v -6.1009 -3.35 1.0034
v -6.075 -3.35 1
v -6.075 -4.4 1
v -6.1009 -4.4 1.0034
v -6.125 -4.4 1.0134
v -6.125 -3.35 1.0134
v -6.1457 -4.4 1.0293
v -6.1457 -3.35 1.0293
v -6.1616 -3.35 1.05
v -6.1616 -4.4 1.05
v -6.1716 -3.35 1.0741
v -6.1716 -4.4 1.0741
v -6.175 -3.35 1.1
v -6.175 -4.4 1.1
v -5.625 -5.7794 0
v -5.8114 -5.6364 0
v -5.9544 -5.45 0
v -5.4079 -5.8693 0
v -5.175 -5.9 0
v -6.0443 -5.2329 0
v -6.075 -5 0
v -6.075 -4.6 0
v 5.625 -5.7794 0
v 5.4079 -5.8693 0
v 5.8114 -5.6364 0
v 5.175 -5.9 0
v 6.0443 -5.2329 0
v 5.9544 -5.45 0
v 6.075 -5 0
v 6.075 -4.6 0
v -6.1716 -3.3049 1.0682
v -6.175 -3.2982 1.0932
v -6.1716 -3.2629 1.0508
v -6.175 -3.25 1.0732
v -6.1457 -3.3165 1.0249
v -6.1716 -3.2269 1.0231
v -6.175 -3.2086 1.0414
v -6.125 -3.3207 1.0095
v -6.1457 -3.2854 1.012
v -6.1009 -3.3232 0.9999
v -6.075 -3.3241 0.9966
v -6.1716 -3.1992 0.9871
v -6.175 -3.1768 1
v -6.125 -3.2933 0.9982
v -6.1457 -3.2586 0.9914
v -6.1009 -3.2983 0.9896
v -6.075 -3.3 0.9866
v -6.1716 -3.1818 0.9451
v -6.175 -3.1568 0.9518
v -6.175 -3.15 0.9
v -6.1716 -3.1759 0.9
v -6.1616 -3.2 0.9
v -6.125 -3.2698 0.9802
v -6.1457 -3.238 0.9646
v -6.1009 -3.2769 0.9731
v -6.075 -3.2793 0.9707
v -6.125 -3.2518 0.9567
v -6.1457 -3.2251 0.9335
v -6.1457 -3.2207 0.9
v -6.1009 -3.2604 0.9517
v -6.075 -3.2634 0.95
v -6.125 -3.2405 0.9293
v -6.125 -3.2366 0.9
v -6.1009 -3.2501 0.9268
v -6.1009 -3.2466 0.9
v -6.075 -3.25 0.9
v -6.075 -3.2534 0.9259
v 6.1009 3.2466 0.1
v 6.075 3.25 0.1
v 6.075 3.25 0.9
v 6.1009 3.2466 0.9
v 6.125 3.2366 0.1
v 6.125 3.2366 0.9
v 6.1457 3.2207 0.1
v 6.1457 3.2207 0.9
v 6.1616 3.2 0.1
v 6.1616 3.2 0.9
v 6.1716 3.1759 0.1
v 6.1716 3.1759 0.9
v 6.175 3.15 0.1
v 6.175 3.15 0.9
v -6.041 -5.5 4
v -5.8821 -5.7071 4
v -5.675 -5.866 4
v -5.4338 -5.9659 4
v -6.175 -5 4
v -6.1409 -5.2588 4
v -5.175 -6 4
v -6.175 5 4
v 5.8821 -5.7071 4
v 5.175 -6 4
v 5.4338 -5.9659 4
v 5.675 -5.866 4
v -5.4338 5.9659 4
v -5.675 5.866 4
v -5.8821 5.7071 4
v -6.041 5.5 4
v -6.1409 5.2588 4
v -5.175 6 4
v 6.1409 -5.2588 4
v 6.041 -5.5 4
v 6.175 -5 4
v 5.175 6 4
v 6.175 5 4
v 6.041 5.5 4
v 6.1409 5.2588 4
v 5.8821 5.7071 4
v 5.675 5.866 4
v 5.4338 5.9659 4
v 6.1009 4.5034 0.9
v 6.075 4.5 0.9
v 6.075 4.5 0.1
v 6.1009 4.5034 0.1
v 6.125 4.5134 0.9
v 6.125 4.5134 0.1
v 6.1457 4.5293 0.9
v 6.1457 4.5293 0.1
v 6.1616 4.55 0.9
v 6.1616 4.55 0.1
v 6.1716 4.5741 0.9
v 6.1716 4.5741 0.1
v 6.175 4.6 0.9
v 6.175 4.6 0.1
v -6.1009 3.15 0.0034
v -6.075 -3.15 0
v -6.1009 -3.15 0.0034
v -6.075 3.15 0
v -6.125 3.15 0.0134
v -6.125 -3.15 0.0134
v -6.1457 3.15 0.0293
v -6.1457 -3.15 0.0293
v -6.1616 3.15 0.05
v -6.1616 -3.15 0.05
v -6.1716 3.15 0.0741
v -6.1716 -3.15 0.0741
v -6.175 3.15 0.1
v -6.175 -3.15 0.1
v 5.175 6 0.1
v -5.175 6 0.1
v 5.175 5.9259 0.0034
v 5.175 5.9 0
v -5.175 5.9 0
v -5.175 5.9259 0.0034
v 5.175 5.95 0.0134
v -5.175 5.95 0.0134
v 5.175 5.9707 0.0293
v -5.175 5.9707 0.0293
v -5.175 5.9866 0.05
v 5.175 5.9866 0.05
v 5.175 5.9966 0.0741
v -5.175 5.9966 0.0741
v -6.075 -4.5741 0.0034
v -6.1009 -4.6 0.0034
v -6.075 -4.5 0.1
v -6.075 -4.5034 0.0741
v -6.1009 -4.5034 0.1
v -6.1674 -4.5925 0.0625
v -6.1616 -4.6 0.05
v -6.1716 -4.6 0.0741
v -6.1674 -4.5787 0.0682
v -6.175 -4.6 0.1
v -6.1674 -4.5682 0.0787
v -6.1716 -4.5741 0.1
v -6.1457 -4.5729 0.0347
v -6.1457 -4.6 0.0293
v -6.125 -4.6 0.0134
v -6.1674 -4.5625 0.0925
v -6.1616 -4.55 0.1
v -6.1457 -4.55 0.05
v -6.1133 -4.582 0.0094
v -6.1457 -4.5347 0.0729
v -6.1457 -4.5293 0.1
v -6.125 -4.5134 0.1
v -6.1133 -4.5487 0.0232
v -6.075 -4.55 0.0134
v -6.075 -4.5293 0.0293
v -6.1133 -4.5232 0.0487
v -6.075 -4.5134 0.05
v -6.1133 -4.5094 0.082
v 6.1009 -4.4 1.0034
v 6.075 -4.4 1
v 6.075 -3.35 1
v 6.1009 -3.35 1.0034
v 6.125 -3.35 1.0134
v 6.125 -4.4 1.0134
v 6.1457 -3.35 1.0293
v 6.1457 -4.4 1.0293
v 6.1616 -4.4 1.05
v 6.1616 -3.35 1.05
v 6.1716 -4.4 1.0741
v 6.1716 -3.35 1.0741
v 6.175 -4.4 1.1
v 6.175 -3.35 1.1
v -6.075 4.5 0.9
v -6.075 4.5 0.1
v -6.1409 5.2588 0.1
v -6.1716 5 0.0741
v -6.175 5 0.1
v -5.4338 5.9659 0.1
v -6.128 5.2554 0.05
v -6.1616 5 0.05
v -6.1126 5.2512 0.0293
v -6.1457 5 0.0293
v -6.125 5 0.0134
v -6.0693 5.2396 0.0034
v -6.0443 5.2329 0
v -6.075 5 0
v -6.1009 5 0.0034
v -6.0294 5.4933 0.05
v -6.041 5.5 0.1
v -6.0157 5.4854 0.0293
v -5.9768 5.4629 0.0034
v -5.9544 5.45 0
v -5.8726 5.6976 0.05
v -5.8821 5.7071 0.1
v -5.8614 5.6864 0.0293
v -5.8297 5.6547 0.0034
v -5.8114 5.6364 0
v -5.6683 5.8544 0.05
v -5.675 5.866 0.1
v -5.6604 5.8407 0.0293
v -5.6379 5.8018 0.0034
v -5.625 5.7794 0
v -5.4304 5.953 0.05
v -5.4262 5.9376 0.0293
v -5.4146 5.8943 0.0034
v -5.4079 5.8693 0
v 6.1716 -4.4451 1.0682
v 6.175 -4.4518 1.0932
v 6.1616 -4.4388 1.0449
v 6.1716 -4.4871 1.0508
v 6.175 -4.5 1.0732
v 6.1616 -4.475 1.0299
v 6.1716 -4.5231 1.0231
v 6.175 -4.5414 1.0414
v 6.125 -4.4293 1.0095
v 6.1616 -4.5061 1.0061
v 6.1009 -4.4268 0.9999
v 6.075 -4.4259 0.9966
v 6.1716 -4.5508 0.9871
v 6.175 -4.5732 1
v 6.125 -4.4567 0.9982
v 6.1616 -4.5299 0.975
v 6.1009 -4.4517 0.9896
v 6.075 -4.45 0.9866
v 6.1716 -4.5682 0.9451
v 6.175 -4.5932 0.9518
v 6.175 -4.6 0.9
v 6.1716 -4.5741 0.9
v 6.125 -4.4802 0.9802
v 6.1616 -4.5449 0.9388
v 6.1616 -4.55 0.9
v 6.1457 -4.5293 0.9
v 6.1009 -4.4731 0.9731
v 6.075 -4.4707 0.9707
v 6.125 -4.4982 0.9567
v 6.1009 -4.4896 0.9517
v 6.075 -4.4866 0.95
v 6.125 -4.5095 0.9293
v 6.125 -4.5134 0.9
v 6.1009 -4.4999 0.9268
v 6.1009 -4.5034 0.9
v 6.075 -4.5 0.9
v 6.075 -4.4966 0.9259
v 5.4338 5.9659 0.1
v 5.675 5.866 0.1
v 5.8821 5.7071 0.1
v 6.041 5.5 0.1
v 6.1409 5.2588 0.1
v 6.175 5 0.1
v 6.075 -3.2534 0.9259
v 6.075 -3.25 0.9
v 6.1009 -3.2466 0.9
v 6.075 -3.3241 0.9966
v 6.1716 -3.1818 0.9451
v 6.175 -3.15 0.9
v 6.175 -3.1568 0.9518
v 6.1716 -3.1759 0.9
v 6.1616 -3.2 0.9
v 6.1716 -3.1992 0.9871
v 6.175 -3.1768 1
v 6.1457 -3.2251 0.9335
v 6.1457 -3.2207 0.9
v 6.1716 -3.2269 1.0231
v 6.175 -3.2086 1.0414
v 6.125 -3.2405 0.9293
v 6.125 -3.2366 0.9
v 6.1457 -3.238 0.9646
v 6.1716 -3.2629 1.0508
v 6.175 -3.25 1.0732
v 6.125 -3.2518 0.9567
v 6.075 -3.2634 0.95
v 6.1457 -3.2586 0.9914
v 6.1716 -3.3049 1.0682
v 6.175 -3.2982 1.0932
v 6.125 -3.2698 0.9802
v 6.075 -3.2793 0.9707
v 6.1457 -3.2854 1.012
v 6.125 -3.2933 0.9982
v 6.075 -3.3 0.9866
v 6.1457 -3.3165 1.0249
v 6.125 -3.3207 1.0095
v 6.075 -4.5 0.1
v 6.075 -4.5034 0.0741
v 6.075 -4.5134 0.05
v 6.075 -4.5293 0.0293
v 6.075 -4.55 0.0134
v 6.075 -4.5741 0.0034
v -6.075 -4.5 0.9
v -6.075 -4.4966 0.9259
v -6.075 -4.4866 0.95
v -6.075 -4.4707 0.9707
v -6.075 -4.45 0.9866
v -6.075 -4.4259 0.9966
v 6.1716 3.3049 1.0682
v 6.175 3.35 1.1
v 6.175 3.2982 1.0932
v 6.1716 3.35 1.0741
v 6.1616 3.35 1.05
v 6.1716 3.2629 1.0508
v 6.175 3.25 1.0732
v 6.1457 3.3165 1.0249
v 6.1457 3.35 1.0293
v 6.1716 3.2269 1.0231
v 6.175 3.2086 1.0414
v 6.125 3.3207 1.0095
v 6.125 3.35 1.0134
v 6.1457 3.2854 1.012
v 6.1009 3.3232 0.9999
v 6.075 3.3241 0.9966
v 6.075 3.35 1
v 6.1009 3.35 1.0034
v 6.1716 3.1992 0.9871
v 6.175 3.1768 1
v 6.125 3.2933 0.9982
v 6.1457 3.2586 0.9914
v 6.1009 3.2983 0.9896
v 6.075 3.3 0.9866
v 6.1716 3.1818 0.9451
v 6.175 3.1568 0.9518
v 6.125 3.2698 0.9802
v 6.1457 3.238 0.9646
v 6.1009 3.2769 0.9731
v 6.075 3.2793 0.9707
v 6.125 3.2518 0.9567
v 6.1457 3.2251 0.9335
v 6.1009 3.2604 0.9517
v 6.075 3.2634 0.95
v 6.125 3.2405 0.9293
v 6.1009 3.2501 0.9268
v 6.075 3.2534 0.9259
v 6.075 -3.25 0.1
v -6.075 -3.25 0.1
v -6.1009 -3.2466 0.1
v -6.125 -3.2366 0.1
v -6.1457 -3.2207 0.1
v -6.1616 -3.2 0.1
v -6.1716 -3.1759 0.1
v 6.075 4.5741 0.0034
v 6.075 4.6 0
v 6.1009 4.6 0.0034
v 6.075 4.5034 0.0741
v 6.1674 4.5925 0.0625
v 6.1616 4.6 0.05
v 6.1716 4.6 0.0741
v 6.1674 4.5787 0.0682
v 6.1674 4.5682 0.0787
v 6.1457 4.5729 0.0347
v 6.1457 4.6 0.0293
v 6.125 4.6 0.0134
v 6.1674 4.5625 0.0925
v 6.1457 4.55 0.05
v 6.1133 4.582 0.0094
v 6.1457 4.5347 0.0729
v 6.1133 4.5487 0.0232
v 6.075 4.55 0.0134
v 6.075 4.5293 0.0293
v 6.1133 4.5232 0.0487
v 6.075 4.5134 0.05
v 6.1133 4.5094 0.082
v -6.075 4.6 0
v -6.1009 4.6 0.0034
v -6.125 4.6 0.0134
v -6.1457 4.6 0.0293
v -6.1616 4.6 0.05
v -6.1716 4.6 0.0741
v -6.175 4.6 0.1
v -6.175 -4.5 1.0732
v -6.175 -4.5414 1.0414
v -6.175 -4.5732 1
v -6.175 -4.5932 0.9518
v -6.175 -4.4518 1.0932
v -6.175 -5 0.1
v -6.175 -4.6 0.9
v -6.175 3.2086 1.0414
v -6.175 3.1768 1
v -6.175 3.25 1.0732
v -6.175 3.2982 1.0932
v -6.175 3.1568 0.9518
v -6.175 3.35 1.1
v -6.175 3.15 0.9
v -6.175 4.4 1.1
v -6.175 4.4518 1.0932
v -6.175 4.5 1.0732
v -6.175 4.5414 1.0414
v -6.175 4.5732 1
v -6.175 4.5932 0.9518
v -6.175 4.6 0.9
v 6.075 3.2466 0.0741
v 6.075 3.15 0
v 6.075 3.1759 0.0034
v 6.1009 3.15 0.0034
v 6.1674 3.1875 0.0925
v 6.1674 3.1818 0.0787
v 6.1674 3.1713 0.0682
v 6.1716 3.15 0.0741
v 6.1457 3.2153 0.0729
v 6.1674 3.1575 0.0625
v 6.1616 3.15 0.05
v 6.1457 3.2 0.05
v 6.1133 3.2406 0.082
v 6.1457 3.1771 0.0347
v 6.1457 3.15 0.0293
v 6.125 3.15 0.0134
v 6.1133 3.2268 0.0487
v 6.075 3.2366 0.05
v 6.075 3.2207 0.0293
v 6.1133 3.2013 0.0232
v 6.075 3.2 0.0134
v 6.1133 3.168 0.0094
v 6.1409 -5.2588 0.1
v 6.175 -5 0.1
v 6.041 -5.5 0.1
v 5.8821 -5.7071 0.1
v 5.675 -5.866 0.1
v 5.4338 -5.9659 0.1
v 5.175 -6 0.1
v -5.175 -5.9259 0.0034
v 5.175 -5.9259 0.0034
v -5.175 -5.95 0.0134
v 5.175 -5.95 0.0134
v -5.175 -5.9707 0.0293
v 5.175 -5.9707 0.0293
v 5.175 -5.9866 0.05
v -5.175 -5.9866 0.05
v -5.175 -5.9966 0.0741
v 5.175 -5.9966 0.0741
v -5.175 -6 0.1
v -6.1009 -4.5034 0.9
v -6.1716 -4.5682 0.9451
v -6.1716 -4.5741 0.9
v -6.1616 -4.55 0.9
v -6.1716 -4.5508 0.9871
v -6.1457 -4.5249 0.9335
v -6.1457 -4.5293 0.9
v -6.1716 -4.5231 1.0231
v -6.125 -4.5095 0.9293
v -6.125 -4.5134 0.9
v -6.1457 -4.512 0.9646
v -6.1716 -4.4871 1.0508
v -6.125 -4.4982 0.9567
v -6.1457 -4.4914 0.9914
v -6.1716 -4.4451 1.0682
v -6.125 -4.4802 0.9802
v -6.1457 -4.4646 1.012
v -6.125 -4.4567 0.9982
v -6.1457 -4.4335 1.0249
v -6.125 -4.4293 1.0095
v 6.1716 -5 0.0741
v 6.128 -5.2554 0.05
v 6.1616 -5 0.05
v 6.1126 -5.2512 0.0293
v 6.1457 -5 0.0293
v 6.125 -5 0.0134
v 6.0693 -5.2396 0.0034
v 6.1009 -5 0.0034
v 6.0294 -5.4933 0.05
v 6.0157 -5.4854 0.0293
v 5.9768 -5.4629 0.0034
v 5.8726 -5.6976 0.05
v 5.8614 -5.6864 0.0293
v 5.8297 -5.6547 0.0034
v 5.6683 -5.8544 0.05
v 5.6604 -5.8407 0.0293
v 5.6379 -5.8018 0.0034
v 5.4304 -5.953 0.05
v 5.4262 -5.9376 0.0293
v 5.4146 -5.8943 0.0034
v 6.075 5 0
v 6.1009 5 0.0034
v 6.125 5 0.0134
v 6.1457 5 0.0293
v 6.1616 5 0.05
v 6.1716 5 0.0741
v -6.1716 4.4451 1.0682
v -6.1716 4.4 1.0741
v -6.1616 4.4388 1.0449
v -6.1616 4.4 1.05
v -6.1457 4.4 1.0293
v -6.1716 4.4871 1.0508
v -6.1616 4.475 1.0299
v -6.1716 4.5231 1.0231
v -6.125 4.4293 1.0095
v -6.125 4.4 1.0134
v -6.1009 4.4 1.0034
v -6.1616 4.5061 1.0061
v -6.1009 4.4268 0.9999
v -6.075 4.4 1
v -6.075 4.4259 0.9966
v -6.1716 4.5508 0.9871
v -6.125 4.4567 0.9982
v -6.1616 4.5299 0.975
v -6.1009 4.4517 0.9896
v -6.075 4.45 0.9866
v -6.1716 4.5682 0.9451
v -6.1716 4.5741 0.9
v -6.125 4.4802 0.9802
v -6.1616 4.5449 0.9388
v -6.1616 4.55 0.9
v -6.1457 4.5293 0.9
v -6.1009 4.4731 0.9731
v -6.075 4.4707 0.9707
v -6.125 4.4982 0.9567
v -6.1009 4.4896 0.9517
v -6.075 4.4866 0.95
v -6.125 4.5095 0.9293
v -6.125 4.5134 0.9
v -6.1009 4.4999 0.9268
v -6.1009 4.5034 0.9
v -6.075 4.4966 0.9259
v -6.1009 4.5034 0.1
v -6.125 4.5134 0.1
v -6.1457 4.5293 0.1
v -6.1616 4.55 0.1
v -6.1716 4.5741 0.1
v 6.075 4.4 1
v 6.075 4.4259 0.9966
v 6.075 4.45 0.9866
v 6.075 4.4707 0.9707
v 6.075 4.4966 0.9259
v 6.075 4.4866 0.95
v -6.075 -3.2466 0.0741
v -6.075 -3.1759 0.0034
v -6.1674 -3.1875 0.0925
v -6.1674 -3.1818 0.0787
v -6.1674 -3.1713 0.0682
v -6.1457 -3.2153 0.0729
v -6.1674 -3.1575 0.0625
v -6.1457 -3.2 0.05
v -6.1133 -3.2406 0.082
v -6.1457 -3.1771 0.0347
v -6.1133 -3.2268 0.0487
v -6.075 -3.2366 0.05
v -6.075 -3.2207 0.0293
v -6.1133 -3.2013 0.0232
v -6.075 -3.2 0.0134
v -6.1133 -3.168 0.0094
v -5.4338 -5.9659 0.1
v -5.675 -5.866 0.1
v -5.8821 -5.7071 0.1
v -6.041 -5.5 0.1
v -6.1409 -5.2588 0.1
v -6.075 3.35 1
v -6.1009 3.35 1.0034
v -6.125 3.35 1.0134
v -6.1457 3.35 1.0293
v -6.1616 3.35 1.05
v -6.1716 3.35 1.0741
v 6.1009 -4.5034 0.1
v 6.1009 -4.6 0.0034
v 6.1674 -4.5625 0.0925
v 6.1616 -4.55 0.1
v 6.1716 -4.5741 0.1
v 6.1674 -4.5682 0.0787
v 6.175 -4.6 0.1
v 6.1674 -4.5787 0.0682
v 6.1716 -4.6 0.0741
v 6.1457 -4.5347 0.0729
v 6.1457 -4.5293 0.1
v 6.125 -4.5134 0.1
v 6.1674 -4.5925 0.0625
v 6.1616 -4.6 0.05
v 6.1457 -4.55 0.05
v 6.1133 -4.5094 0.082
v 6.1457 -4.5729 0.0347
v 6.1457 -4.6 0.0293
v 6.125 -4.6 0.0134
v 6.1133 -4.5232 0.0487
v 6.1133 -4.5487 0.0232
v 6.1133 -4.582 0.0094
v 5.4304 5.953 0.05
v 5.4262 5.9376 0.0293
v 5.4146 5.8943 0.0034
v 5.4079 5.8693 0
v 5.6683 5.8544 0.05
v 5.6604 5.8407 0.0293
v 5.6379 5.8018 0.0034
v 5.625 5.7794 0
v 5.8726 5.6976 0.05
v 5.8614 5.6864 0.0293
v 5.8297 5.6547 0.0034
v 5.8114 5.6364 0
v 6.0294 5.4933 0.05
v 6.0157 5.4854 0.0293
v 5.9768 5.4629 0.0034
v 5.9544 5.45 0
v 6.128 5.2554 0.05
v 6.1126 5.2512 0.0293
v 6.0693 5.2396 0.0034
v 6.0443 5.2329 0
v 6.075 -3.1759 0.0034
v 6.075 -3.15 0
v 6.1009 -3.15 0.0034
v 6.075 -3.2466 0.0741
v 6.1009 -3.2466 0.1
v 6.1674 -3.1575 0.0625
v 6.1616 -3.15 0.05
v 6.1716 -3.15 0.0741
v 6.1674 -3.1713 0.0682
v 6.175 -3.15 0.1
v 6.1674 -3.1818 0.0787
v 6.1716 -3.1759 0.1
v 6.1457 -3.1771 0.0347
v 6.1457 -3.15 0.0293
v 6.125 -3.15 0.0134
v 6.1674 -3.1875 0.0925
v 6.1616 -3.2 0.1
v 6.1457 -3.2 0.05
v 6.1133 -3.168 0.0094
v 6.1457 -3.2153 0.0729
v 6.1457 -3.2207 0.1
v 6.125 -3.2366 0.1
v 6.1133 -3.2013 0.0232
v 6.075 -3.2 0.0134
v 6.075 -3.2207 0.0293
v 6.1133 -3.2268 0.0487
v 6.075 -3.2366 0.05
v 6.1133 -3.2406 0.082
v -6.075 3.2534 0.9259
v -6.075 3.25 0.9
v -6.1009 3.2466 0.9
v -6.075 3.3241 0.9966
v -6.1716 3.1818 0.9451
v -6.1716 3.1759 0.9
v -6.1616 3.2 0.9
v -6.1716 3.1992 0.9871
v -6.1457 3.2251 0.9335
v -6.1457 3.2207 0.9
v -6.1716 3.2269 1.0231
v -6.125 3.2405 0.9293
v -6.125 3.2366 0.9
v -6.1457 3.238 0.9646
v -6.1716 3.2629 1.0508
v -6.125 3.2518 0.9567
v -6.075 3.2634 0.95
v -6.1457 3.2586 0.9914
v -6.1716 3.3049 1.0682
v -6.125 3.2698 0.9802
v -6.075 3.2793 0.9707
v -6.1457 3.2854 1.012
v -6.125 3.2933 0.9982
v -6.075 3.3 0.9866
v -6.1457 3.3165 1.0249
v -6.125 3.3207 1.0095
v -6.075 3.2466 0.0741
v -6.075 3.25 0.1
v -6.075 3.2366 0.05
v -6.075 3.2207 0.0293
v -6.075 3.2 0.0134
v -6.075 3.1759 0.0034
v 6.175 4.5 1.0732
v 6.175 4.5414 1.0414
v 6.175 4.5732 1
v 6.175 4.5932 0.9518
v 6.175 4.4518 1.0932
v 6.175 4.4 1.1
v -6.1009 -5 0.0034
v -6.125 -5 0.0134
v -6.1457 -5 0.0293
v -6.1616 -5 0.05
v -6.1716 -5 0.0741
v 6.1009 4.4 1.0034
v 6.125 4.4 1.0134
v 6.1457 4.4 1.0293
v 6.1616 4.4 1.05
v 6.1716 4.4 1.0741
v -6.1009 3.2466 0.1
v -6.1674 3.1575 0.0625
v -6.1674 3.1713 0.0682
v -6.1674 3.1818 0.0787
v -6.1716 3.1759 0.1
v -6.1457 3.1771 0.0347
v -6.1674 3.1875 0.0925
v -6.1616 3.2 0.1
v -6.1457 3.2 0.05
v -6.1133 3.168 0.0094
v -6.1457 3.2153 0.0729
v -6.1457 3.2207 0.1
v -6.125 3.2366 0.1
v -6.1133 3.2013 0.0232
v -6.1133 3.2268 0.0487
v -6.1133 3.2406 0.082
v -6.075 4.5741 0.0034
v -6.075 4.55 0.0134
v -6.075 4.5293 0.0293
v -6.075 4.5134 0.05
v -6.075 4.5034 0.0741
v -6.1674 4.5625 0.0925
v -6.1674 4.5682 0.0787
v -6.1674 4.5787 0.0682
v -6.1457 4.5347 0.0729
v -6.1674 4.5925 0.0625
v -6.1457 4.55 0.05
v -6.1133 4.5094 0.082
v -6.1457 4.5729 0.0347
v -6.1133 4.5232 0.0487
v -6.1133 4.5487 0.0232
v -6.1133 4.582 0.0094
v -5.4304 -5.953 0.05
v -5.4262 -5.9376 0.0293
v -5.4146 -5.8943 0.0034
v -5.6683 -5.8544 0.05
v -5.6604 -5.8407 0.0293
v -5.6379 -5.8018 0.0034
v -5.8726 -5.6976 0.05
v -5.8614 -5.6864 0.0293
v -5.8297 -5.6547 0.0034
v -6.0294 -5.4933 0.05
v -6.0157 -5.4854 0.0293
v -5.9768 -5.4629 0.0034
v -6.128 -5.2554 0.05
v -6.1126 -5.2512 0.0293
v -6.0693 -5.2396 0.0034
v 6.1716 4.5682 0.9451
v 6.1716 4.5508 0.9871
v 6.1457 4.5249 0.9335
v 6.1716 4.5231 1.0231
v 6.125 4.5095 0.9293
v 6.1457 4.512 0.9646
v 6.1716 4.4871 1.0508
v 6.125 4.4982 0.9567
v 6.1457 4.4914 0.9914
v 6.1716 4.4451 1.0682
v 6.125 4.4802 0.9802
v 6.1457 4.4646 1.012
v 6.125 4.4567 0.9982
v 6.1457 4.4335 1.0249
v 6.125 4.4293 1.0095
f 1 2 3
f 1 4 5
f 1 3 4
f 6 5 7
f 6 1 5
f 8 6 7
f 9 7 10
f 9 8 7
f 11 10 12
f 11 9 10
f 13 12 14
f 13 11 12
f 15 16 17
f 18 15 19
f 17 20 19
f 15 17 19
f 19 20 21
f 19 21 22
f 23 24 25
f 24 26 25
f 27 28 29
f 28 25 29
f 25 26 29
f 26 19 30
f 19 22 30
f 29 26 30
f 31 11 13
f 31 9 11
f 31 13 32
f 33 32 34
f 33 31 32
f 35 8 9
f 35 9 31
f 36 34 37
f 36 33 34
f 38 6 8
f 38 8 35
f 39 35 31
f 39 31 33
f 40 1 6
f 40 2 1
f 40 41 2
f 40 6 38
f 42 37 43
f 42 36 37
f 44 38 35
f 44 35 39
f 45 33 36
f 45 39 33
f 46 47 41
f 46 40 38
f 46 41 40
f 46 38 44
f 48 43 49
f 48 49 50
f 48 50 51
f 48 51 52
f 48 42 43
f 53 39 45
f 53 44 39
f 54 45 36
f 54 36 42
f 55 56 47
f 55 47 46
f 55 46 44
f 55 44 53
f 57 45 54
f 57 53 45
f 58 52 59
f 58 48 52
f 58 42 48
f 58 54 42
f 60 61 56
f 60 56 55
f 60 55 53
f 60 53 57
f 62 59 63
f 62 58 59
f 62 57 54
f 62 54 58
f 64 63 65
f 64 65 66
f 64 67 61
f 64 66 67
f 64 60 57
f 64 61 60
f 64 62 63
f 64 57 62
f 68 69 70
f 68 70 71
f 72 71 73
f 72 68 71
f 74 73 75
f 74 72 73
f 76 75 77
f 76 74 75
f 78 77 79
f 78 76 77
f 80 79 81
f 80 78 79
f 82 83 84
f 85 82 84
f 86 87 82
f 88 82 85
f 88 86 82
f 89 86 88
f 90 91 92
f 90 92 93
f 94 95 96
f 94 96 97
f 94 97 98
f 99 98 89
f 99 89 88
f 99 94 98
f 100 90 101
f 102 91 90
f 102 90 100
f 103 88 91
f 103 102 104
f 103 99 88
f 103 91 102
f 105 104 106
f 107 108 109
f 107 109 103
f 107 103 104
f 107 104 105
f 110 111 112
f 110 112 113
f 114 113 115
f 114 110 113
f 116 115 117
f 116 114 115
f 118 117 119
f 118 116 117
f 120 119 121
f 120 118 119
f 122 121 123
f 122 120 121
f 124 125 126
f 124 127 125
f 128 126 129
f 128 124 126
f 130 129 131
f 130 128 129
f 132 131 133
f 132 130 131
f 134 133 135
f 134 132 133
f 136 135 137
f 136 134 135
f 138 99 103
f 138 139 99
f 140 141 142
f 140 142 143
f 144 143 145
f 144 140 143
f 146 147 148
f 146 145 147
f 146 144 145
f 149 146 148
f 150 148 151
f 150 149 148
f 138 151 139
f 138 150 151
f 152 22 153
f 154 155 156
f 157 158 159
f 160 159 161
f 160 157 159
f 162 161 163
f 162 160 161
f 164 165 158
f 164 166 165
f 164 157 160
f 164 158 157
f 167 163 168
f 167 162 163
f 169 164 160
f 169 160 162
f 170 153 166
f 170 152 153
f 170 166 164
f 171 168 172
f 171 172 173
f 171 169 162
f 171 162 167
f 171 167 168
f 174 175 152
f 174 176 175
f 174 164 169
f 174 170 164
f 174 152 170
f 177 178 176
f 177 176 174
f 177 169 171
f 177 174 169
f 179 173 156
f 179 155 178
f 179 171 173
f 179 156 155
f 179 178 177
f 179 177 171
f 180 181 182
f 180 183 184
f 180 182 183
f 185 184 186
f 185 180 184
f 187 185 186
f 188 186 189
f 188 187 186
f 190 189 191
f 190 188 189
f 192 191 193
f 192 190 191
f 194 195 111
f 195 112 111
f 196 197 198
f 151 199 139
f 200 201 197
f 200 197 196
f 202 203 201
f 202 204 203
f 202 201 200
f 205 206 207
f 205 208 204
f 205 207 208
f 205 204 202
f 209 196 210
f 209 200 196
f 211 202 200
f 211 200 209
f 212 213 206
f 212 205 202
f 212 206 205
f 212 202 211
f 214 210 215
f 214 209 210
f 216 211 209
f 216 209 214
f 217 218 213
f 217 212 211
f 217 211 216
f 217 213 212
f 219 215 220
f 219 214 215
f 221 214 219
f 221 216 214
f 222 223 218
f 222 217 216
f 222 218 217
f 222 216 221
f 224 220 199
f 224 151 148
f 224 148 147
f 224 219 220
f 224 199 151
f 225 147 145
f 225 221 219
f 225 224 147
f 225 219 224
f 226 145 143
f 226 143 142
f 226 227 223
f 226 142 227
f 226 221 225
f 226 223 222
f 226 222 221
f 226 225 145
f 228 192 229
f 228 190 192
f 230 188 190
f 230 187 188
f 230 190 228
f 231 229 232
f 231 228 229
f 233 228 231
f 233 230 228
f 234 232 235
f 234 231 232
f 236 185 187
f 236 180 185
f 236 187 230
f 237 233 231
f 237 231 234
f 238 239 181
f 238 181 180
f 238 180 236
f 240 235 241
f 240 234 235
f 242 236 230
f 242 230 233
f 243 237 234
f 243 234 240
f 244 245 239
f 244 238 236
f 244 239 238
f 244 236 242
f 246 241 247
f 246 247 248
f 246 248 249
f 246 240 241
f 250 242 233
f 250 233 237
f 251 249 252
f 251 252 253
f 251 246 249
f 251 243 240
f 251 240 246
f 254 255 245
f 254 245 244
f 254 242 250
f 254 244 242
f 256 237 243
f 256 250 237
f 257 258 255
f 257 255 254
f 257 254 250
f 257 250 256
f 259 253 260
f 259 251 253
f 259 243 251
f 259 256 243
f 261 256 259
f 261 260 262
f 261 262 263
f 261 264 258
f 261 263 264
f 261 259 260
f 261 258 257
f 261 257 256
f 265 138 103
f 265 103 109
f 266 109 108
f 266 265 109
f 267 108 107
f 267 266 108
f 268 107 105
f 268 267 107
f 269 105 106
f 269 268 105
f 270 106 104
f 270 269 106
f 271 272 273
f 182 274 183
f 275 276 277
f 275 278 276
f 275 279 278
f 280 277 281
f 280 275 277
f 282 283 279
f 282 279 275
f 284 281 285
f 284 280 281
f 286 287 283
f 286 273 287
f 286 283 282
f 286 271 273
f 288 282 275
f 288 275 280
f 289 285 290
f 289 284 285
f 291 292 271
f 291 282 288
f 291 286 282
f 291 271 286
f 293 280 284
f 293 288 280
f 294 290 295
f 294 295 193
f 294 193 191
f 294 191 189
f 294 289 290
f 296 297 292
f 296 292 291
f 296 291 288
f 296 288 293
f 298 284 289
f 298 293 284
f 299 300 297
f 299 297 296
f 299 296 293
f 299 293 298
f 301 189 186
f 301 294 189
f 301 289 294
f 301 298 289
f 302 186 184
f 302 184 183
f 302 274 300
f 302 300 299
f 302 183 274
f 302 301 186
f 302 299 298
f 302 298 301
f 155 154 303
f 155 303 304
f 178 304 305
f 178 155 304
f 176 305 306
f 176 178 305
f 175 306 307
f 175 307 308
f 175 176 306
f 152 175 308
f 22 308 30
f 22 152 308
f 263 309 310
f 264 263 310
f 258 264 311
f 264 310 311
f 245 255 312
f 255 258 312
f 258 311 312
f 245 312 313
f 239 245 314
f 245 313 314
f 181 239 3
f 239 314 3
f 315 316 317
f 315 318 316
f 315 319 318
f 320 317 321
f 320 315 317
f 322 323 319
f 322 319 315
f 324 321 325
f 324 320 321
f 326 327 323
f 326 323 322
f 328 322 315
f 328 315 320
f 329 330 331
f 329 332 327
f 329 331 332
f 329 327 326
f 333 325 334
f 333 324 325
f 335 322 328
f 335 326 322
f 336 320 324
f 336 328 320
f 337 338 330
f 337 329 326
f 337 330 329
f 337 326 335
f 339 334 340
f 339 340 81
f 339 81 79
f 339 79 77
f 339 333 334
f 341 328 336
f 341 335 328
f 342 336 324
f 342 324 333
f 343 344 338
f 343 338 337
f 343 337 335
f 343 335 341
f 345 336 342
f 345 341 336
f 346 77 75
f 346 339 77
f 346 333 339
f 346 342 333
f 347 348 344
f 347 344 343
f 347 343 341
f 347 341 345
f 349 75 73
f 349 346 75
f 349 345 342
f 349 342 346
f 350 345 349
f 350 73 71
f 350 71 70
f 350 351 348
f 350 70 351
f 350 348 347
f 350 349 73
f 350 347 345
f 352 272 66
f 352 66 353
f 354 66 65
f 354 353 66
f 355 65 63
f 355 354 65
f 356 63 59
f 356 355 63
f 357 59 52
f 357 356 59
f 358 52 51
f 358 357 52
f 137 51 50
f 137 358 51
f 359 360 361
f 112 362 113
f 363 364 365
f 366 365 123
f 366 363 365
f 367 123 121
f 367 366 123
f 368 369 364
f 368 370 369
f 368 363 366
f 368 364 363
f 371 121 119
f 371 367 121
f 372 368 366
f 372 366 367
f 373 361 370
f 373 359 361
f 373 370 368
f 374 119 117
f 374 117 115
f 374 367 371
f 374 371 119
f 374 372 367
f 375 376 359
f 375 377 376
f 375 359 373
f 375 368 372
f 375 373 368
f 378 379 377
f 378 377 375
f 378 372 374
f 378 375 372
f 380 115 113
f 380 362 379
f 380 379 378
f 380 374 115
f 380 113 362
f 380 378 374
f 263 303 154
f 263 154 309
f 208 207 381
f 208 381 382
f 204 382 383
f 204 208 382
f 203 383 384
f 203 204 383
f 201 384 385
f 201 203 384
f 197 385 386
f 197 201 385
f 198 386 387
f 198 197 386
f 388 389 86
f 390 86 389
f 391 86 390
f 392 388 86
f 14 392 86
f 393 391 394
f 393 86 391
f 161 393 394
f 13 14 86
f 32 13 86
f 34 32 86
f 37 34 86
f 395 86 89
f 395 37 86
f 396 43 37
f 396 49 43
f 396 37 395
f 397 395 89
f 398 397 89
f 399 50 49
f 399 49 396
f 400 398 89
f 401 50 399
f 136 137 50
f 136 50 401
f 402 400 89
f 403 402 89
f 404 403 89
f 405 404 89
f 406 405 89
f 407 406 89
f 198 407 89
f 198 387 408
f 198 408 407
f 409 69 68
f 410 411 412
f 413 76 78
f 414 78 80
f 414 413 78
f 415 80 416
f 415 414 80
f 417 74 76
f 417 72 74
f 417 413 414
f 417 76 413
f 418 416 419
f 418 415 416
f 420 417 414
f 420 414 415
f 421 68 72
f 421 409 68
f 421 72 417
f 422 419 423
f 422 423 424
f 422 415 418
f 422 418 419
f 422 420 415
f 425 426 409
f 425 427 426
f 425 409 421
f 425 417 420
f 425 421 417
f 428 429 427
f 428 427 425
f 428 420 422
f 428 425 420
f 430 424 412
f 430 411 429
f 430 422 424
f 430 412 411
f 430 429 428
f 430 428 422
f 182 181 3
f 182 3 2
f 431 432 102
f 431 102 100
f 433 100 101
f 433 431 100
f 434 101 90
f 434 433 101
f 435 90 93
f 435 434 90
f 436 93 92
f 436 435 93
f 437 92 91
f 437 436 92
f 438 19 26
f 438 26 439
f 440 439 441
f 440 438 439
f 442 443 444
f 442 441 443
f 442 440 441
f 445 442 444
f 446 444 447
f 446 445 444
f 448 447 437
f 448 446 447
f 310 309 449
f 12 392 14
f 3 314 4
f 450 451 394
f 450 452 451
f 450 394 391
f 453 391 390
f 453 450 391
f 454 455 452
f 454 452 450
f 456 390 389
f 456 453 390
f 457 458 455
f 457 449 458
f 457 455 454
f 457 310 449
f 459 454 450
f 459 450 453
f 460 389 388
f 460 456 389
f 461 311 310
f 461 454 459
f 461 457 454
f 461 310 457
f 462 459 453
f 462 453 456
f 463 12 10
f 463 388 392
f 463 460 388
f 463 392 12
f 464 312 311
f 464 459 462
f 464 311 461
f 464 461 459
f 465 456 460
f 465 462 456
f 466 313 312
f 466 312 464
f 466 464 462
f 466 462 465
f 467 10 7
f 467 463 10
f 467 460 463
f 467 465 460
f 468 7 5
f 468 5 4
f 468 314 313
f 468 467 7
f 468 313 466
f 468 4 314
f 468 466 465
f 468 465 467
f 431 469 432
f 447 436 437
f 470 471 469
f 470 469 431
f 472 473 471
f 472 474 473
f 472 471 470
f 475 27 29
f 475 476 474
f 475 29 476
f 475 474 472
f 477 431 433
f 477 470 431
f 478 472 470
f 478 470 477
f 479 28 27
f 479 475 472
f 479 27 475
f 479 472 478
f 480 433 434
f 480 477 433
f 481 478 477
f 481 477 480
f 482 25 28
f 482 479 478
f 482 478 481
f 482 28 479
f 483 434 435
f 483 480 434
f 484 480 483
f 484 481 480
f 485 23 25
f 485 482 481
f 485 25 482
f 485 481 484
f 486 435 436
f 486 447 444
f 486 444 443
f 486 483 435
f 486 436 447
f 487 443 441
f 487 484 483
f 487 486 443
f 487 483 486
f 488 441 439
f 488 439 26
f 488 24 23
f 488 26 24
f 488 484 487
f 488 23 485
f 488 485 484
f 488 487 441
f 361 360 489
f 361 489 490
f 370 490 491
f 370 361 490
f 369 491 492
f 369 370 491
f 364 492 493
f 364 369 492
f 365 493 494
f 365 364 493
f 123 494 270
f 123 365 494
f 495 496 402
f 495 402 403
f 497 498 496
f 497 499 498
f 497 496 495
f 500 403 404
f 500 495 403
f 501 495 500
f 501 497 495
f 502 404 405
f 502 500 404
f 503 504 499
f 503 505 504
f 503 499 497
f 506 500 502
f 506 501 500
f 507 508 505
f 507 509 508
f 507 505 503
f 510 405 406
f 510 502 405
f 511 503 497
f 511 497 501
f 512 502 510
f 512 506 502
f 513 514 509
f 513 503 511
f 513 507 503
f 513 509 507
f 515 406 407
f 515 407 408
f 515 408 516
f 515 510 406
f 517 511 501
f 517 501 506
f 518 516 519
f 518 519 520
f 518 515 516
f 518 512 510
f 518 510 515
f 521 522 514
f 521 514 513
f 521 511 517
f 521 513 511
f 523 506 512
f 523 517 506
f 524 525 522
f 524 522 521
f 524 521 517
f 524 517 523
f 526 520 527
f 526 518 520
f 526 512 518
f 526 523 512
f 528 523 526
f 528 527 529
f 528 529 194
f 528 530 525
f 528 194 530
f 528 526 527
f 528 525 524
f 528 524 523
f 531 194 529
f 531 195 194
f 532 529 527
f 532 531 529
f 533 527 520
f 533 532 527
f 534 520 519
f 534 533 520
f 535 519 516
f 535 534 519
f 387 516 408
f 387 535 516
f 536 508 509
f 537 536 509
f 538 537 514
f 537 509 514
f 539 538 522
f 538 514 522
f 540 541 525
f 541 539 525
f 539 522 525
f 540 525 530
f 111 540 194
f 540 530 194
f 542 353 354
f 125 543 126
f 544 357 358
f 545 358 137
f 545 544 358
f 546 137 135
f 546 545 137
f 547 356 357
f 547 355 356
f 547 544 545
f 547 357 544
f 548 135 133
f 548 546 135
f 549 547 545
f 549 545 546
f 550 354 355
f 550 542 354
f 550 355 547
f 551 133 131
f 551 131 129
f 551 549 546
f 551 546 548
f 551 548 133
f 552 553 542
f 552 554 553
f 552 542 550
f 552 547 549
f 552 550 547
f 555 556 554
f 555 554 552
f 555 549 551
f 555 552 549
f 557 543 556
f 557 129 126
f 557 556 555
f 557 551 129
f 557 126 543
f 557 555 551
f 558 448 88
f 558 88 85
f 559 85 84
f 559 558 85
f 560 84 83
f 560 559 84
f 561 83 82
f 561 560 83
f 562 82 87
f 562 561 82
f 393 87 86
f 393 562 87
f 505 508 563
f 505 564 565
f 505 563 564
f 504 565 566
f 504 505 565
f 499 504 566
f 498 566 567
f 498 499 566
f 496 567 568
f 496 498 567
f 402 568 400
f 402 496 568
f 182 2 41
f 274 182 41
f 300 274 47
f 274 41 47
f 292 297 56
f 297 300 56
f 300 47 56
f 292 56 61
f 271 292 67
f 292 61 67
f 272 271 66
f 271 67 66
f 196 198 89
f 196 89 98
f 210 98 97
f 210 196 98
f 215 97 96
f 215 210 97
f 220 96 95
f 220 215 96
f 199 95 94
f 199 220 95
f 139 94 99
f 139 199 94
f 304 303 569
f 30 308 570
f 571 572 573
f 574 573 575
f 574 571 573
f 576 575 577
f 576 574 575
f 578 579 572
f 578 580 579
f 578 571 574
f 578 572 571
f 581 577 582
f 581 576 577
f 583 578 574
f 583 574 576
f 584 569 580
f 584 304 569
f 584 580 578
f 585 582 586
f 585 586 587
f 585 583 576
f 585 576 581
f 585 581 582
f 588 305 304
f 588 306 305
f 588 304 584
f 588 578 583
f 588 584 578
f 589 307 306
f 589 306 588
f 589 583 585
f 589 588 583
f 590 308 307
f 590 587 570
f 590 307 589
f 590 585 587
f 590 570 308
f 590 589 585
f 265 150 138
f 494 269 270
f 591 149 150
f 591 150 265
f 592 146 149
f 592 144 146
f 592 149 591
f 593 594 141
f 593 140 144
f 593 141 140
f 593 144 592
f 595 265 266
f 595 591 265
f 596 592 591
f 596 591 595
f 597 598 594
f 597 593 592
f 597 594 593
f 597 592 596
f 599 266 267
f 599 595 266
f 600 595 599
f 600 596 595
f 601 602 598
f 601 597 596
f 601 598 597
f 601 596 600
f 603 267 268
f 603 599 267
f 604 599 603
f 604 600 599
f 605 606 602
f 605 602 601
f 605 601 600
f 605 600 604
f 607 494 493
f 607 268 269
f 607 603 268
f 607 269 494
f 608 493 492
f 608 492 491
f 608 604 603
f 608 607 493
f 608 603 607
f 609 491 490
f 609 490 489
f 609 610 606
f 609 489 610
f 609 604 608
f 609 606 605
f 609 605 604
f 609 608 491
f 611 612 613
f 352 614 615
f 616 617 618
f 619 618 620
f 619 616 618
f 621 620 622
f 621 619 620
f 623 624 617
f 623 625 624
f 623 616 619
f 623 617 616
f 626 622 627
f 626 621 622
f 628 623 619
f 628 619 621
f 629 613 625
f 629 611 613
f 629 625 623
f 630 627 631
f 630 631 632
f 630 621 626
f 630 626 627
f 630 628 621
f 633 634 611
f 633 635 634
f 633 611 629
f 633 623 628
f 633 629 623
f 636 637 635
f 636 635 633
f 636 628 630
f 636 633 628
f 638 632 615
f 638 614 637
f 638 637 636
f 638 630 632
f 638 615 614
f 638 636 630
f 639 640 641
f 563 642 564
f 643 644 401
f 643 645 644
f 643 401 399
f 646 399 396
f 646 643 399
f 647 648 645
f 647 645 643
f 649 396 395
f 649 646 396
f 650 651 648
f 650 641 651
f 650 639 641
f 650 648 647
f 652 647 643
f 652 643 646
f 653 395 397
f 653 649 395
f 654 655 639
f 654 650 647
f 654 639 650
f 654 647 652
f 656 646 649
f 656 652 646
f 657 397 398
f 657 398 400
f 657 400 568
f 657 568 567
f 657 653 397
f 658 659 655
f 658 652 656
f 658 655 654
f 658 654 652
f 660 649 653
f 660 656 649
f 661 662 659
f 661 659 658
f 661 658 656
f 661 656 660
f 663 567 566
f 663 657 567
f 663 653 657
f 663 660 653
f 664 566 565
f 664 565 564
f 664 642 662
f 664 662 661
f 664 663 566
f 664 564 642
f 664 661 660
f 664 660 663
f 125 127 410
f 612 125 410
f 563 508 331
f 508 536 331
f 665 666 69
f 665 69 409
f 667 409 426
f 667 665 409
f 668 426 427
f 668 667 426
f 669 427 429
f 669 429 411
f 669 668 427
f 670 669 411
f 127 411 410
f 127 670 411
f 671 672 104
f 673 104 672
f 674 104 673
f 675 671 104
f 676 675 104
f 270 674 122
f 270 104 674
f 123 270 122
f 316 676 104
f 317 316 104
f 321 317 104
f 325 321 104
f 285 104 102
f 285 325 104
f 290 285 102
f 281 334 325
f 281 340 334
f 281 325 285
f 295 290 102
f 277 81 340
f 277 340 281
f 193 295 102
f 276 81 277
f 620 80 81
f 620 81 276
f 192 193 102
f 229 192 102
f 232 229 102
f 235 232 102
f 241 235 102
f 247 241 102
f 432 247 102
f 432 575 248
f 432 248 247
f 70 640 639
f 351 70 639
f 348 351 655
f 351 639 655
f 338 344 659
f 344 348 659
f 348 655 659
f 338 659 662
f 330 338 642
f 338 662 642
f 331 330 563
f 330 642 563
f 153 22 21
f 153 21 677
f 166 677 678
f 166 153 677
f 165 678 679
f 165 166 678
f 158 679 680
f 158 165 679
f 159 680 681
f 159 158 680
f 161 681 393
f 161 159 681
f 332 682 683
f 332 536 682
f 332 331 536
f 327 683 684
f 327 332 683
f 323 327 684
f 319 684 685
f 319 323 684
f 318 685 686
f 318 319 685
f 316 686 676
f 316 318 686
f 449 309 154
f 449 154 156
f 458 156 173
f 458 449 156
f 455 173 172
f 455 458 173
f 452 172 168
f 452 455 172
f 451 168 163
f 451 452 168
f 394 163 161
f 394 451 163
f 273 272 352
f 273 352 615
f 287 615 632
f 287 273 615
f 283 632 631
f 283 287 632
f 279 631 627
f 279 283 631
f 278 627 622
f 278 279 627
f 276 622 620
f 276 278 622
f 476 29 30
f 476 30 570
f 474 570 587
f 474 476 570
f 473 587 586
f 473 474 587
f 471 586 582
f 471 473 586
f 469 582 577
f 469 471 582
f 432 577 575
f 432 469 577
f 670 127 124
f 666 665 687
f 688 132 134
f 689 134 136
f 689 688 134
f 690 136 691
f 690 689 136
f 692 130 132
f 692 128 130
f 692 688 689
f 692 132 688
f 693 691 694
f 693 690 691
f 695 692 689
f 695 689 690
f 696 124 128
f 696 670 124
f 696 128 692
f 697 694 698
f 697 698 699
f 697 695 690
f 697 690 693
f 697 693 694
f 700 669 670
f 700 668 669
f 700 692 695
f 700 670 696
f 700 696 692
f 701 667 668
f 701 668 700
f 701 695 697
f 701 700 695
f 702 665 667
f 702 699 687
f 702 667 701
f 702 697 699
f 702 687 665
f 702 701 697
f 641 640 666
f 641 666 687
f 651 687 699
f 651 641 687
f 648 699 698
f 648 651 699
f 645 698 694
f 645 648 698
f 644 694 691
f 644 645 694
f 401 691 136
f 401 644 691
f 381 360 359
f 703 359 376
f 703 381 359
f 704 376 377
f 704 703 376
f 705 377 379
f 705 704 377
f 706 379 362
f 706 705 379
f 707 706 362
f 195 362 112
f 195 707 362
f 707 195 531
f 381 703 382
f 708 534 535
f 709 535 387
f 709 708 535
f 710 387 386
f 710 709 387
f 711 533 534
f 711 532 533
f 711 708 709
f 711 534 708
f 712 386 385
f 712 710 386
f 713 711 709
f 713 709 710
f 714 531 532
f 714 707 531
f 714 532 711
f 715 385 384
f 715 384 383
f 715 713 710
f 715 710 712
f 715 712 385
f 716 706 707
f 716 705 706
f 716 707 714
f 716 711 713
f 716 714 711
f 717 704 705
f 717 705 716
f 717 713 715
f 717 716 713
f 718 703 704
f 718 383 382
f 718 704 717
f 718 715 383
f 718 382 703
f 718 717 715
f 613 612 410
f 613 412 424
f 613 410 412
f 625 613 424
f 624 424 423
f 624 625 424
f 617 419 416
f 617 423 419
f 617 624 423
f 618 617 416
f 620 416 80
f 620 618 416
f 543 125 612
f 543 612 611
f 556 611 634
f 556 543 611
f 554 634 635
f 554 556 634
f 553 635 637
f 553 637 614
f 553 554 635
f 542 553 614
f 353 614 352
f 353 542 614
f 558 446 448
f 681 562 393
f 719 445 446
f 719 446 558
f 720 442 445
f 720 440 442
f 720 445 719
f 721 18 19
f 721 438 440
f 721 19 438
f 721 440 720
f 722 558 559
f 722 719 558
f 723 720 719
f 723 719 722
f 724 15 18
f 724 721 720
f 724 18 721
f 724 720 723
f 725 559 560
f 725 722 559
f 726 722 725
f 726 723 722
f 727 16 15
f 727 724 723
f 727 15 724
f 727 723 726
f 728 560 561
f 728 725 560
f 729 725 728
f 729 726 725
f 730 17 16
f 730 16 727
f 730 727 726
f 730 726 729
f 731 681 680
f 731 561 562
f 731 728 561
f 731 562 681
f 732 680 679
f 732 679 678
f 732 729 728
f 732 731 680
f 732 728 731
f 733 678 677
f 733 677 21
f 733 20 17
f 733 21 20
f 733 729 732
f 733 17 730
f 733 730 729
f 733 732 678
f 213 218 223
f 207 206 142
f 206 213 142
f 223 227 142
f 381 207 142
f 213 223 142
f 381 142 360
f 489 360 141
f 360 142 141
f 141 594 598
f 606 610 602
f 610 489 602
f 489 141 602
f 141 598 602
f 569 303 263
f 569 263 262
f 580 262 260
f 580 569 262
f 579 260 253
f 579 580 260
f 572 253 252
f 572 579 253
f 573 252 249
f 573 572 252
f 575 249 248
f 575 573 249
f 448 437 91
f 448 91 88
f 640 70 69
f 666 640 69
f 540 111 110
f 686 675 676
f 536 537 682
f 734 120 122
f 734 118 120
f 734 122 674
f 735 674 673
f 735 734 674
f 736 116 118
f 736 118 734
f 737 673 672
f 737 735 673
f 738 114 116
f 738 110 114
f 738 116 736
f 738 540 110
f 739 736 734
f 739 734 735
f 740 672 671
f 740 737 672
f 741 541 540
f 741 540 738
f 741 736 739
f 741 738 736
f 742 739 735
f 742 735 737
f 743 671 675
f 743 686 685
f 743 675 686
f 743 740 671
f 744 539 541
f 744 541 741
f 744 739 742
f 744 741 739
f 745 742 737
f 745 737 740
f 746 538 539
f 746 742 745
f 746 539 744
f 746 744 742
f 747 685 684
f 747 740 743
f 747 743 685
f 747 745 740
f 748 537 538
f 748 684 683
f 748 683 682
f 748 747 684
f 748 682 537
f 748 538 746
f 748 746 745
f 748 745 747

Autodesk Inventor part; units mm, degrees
ref_plane "YZ Plane" through (0, 0, 0) normal (1, 0, 0) x (0, 1, 0)
ref_plane "XZ Plane" through (0, 0, 0) normal (0, 1, 0) x (-1, 0, 0)
ref_plane "XY Plane" through (0, 0, 0) normal (0, 0, 1) x (1, 0, 0)
sketch "Sketch1" plane through (0, 0, 0) normal (0, 0, 1) x (1, 0, 0)
  line L0 (-5.175, 6) -> (5.175, 6)
  line L1 (6.175, 5) -> (6.175, -5)
  line L2 (5.175, -6) -> (-5.175, -6)
  line L3 (-6.175, -5) -> (-6.175, 5)
  arc A0 (-5.175, 6) -> (-6.175, 5) centre (-5.175, 5) ccw
  arc A1 (6.175, 5) -> (5.175, 6) centre (5.175, 5) ccw
  arc A2 (-6.175, -5) -> (-5.175, -6) centre (-5.175, -5) ccw
  arc A3 (5.175, -6) -> (6.175, -5) centre (5.175, -5) ccw
  point P0 (0, 0)
  point P1 (0, 6)
  point P2 (-6.175, 0)
  dimension "d0" = 12.35
  dimension "d1" = 12
  dimension "d2" = 1
extrude "Extrusion1" add sketch "Sketch1" along normal blind 4
sketch "Sketch2" plane through (6.175, -5, 0) normal (1, 0, 0) x (0, 0, -1)
  line L0 (0, 10) -> (0, 0) projected
  line L1 (0, 9.5) -> (-1, 9.5)
  line L2 (-1, 9.5) -> (-1, 8.25)
  line L3 (-1, 8.25) -> (0, 8.25)
  line L4 (0, 8.25) -> (0, 9.5)
  line L5 (0, 0.5) -> (-1, 0.5)
  line L6 (-1, 0.5) -> (-1, 1.75)
  line L7 (-1, 1.75) -> (0, 1.75)
  line L8 (0, 1.75) -> (0, 0.5)
  point P0 (0, 5)
  dimension "d5" = 1.25
  dimension "d6" = 1.25
  dimension "d11" = 1
  dimension "d12" = 1
extrude "Extrusion2" cut sketch "Sketch2" against normal through all
fillet "Fillet1" radius 0.1 8 edges at (0, -4.5, 0) (0, -4.5, 1) (0, -3.25, 1) (0, -3.25, 0) (0, 3.25, 1) (0, 4.5, 1) (0, 4.5, 0) (0, 3.25, 0)
fillet "Fillet2" radius 0.1 40 edges at (6.175, 0, 0) (6.175, -3.2207, 0.0293) (6.175, -3.25, 0.5) (6.175, -3.2793, 0.9707) (6.175, -3.875, 1) (6.175, -4.4707, 0.9707) (6.175, -4.5, 0.5) (6.175, -4.5293, 0.0293) (6.175, -4.8, 0) (5.8821, -5.7071, 0) (0, -6, 0) (-5.8821, -5.7071, 0) (-6.175, -4.8, 0) (-6.175, -4.5293, 0.0293) (-6.175, -4.5, 0.5) (-6.175, -4.4707, 0.9707) (-6.175, -3.875, 1) (-6.175, -3.2793, 0.9707) (-6.175, -3.25, 0.5) (-6.175, -3.2207, 0.0293) (-6.175, 0, 0) (-6.175, 3.2207, 0.0293) (-6.175, 3.25, 0.5) (-6.175, 3.2793, 0.9707) (-6.175, 3.875, 1) (-6.175, 4.4707, 0.9707) (-6.175, 4.5, 0.5) (-6.175, 4.5293, 0.0293) (-6.175, 4.8, 0) (-5.8821, 5.7071, 0) (0, 6, 0) (5.8821, 5.7071, 0) (6.175, 4.8, 0) (6.175, 4.5293, 0.0293) (6.175, 4.5, 0.5) (6.175, 4.4707, 0.9707) (6.175, 3.875, 1) (6.175, 3.2793, 0.9707) (6.175, 3.25, 0.5) (6.175, 3.2207, 0.0293)
equation "\"d6\" = d5"
equation "\"d12\" = d11"
properties part number "12mm Incremental Encoder Base"
